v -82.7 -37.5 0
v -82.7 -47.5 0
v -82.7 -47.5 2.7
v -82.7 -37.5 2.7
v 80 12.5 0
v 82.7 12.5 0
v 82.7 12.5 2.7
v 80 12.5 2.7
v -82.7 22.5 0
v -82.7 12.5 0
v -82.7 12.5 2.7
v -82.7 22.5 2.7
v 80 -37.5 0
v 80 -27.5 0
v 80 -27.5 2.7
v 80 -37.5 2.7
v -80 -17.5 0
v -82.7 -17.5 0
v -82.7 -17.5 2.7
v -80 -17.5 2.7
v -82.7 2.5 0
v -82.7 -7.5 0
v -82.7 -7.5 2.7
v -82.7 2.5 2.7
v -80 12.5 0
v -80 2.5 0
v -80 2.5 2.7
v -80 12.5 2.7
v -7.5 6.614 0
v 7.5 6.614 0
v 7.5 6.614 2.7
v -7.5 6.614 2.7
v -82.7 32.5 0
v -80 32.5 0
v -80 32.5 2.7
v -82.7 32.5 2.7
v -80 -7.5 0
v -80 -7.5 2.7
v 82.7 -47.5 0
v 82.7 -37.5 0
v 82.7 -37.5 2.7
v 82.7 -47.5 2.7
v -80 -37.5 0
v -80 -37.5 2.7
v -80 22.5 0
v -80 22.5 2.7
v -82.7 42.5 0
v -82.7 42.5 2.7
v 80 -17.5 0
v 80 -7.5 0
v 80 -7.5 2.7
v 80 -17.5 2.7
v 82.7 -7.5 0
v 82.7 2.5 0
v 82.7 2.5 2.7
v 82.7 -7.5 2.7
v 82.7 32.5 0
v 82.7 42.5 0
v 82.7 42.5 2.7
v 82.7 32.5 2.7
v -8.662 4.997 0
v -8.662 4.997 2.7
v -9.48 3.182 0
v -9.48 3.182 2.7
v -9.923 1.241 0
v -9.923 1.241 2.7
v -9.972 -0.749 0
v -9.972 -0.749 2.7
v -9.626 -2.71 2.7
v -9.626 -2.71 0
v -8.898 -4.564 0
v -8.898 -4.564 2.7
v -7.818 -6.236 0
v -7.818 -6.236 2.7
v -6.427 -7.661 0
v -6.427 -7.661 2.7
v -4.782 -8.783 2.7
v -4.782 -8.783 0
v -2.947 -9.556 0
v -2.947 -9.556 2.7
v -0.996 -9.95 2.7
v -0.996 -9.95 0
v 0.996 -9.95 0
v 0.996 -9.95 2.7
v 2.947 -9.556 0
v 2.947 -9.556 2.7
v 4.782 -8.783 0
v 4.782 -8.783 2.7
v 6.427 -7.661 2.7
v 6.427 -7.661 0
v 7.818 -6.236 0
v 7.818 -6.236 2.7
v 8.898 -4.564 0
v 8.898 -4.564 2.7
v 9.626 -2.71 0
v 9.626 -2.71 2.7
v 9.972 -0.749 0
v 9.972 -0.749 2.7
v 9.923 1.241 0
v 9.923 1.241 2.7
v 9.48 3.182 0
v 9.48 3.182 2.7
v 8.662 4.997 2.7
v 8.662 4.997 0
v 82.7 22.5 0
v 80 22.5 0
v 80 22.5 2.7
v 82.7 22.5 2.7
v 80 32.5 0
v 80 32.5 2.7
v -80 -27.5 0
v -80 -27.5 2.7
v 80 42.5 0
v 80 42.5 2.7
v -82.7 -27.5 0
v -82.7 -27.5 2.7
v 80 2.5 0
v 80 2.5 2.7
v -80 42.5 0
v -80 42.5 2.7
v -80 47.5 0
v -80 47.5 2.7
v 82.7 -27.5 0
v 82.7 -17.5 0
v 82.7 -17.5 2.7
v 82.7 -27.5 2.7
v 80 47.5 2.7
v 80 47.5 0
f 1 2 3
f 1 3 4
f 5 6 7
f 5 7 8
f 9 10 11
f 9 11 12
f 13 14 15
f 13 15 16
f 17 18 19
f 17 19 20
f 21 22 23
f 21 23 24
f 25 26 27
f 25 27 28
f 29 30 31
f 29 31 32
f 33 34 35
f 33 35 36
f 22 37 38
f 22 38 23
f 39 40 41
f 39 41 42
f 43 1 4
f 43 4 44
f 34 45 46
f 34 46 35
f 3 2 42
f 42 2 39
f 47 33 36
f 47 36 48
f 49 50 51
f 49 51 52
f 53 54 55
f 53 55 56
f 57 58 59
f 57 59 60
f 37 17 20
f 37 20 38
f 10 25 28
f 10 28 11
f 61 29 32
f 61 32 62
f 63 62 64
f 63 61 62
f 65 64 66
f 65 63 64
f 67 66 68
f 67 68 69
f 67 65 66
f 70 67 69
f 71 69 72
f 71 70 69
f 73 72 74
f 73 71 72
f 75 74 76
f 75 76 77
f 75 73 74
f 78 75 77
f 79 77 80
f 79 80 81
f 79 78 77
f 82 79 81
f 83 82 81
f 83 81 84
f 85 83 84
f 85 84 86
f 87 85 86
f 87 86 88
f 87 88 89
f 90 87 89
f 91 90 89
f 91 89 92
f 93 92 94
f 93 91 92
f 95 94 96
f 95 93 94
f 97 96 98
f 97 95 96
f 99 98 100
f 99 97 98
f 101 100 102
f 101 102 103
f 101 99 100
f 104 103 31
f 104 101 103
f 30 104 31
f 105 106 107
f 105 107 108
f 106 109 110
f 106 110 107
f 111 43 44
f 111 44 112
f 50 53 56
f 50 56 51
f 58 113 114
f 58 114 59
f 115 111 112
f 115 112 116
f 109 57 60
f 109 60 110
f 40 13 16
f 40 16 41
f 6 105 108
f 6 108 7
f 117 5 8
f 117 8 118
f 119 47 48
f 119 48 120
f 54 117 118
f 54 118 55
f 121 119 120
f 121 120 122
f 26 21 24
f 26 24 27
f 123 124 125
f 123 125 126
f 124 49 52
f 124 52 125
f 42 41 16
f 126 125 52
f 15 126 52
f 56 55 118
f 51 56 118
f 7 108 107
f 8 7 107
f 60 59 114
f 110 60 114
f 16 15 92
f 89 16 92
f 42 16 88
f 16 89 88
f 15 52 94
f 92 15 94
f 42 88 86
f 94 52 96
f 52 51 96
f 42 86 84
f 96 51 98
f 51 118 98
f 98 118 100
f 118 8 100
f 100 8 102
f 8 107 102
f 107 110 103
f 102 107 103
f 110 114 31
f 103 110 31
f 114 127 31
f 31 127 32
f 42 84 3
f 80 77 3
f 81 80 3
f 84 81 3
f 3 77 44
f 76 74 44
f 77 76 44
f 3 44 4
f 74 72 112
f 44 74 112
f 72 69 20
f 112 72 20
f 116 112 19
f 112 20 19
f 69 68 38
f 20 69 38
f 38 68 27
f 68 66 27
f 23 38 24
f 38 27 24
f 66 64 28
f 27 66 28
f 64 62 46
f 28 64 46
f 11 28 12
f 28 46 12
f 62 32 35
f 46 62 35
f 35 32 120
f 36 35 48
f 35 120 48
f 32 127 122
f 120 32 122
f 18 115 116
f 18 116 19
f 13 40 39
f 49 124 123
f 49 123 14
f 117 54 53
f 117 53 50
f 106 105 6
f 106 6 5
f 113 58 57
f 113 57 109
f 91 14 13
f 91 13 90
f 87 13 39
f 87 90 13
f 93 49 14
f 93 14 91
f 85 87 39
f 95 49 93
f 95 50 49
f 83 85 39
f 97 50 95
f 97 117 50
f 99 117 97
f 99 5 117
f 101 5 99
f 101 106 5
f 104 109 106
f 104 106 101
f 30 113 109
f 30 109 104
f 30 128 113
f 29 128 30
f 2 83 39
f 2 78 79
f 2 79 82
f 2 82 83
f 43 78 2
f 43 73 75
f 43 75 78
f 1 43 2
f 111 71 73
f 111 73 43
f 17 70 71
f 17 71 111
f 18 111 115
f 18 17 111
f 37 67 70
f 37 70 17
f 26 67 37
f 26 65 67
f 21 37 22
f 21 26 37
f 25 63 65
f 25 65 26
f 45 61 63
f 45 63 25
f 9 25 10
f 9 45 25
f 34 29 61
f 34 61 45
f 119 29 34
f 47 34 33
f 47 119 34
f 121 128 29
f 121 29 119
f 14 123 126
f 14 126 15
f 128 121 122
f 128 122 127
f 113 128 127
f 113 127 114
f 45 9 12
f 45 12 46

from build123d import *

# Parameters (mm, degrees)
BOSS_EXTRUDE1_DEPTH = 2.7


with BuildPart() as part:
    # Sketch1 → Boss-Extrude1 (new body)
    with BuildSketch(Plane.XY):
        Polygon((80, -17.5), (82.7, -17.5), (82.7, -27.5), (80, -27.5), (80, -37.5), (82.7, -37.5), (82.7, -47.5), (80, -47.5), (-80, -47.5), (-82.7, -47.5), (-82.7, -37.5), (-80, -37.5), (-80, -27.5), (-82.7, -27.5), (-82.7, -17.5), (-80, -17.5), (-80, -7.5), (-82.7, -7.5), (-82.7, 2.5), (-80, 2.5), (-80, 12.5), (-82.7, 12.5), (-82.7, 22.5), (-80, 22.5), (-80, 32.5), (-82.7, 32.5), (-82.7, 42.5), (-80, 42.5), (-80, 47.5), (80, 47.5), (80, 42.5), (82.7, 42.5), (82.7, 32.5), (80, 32.5), (80, 22.5), (82.7, 22.5), (82.7, 12.5), (80, 12.5), (80, 2.5), (82.7, 2.5), (82.7, -7.5), (80, -7.5), align=None)
        with BuildLine():
            ThreePointArc((-7.5, 6.614378278), (0, -10), (7.5, 6.614378278))
            Line((7.5, 6.614378278), (-7.5, 6.614378278))
        make_face(mode=Mode.SUBTRACT)
    extrude(amount=BOSS_EXTRUDE1_DEPTH)


solid = part.part
